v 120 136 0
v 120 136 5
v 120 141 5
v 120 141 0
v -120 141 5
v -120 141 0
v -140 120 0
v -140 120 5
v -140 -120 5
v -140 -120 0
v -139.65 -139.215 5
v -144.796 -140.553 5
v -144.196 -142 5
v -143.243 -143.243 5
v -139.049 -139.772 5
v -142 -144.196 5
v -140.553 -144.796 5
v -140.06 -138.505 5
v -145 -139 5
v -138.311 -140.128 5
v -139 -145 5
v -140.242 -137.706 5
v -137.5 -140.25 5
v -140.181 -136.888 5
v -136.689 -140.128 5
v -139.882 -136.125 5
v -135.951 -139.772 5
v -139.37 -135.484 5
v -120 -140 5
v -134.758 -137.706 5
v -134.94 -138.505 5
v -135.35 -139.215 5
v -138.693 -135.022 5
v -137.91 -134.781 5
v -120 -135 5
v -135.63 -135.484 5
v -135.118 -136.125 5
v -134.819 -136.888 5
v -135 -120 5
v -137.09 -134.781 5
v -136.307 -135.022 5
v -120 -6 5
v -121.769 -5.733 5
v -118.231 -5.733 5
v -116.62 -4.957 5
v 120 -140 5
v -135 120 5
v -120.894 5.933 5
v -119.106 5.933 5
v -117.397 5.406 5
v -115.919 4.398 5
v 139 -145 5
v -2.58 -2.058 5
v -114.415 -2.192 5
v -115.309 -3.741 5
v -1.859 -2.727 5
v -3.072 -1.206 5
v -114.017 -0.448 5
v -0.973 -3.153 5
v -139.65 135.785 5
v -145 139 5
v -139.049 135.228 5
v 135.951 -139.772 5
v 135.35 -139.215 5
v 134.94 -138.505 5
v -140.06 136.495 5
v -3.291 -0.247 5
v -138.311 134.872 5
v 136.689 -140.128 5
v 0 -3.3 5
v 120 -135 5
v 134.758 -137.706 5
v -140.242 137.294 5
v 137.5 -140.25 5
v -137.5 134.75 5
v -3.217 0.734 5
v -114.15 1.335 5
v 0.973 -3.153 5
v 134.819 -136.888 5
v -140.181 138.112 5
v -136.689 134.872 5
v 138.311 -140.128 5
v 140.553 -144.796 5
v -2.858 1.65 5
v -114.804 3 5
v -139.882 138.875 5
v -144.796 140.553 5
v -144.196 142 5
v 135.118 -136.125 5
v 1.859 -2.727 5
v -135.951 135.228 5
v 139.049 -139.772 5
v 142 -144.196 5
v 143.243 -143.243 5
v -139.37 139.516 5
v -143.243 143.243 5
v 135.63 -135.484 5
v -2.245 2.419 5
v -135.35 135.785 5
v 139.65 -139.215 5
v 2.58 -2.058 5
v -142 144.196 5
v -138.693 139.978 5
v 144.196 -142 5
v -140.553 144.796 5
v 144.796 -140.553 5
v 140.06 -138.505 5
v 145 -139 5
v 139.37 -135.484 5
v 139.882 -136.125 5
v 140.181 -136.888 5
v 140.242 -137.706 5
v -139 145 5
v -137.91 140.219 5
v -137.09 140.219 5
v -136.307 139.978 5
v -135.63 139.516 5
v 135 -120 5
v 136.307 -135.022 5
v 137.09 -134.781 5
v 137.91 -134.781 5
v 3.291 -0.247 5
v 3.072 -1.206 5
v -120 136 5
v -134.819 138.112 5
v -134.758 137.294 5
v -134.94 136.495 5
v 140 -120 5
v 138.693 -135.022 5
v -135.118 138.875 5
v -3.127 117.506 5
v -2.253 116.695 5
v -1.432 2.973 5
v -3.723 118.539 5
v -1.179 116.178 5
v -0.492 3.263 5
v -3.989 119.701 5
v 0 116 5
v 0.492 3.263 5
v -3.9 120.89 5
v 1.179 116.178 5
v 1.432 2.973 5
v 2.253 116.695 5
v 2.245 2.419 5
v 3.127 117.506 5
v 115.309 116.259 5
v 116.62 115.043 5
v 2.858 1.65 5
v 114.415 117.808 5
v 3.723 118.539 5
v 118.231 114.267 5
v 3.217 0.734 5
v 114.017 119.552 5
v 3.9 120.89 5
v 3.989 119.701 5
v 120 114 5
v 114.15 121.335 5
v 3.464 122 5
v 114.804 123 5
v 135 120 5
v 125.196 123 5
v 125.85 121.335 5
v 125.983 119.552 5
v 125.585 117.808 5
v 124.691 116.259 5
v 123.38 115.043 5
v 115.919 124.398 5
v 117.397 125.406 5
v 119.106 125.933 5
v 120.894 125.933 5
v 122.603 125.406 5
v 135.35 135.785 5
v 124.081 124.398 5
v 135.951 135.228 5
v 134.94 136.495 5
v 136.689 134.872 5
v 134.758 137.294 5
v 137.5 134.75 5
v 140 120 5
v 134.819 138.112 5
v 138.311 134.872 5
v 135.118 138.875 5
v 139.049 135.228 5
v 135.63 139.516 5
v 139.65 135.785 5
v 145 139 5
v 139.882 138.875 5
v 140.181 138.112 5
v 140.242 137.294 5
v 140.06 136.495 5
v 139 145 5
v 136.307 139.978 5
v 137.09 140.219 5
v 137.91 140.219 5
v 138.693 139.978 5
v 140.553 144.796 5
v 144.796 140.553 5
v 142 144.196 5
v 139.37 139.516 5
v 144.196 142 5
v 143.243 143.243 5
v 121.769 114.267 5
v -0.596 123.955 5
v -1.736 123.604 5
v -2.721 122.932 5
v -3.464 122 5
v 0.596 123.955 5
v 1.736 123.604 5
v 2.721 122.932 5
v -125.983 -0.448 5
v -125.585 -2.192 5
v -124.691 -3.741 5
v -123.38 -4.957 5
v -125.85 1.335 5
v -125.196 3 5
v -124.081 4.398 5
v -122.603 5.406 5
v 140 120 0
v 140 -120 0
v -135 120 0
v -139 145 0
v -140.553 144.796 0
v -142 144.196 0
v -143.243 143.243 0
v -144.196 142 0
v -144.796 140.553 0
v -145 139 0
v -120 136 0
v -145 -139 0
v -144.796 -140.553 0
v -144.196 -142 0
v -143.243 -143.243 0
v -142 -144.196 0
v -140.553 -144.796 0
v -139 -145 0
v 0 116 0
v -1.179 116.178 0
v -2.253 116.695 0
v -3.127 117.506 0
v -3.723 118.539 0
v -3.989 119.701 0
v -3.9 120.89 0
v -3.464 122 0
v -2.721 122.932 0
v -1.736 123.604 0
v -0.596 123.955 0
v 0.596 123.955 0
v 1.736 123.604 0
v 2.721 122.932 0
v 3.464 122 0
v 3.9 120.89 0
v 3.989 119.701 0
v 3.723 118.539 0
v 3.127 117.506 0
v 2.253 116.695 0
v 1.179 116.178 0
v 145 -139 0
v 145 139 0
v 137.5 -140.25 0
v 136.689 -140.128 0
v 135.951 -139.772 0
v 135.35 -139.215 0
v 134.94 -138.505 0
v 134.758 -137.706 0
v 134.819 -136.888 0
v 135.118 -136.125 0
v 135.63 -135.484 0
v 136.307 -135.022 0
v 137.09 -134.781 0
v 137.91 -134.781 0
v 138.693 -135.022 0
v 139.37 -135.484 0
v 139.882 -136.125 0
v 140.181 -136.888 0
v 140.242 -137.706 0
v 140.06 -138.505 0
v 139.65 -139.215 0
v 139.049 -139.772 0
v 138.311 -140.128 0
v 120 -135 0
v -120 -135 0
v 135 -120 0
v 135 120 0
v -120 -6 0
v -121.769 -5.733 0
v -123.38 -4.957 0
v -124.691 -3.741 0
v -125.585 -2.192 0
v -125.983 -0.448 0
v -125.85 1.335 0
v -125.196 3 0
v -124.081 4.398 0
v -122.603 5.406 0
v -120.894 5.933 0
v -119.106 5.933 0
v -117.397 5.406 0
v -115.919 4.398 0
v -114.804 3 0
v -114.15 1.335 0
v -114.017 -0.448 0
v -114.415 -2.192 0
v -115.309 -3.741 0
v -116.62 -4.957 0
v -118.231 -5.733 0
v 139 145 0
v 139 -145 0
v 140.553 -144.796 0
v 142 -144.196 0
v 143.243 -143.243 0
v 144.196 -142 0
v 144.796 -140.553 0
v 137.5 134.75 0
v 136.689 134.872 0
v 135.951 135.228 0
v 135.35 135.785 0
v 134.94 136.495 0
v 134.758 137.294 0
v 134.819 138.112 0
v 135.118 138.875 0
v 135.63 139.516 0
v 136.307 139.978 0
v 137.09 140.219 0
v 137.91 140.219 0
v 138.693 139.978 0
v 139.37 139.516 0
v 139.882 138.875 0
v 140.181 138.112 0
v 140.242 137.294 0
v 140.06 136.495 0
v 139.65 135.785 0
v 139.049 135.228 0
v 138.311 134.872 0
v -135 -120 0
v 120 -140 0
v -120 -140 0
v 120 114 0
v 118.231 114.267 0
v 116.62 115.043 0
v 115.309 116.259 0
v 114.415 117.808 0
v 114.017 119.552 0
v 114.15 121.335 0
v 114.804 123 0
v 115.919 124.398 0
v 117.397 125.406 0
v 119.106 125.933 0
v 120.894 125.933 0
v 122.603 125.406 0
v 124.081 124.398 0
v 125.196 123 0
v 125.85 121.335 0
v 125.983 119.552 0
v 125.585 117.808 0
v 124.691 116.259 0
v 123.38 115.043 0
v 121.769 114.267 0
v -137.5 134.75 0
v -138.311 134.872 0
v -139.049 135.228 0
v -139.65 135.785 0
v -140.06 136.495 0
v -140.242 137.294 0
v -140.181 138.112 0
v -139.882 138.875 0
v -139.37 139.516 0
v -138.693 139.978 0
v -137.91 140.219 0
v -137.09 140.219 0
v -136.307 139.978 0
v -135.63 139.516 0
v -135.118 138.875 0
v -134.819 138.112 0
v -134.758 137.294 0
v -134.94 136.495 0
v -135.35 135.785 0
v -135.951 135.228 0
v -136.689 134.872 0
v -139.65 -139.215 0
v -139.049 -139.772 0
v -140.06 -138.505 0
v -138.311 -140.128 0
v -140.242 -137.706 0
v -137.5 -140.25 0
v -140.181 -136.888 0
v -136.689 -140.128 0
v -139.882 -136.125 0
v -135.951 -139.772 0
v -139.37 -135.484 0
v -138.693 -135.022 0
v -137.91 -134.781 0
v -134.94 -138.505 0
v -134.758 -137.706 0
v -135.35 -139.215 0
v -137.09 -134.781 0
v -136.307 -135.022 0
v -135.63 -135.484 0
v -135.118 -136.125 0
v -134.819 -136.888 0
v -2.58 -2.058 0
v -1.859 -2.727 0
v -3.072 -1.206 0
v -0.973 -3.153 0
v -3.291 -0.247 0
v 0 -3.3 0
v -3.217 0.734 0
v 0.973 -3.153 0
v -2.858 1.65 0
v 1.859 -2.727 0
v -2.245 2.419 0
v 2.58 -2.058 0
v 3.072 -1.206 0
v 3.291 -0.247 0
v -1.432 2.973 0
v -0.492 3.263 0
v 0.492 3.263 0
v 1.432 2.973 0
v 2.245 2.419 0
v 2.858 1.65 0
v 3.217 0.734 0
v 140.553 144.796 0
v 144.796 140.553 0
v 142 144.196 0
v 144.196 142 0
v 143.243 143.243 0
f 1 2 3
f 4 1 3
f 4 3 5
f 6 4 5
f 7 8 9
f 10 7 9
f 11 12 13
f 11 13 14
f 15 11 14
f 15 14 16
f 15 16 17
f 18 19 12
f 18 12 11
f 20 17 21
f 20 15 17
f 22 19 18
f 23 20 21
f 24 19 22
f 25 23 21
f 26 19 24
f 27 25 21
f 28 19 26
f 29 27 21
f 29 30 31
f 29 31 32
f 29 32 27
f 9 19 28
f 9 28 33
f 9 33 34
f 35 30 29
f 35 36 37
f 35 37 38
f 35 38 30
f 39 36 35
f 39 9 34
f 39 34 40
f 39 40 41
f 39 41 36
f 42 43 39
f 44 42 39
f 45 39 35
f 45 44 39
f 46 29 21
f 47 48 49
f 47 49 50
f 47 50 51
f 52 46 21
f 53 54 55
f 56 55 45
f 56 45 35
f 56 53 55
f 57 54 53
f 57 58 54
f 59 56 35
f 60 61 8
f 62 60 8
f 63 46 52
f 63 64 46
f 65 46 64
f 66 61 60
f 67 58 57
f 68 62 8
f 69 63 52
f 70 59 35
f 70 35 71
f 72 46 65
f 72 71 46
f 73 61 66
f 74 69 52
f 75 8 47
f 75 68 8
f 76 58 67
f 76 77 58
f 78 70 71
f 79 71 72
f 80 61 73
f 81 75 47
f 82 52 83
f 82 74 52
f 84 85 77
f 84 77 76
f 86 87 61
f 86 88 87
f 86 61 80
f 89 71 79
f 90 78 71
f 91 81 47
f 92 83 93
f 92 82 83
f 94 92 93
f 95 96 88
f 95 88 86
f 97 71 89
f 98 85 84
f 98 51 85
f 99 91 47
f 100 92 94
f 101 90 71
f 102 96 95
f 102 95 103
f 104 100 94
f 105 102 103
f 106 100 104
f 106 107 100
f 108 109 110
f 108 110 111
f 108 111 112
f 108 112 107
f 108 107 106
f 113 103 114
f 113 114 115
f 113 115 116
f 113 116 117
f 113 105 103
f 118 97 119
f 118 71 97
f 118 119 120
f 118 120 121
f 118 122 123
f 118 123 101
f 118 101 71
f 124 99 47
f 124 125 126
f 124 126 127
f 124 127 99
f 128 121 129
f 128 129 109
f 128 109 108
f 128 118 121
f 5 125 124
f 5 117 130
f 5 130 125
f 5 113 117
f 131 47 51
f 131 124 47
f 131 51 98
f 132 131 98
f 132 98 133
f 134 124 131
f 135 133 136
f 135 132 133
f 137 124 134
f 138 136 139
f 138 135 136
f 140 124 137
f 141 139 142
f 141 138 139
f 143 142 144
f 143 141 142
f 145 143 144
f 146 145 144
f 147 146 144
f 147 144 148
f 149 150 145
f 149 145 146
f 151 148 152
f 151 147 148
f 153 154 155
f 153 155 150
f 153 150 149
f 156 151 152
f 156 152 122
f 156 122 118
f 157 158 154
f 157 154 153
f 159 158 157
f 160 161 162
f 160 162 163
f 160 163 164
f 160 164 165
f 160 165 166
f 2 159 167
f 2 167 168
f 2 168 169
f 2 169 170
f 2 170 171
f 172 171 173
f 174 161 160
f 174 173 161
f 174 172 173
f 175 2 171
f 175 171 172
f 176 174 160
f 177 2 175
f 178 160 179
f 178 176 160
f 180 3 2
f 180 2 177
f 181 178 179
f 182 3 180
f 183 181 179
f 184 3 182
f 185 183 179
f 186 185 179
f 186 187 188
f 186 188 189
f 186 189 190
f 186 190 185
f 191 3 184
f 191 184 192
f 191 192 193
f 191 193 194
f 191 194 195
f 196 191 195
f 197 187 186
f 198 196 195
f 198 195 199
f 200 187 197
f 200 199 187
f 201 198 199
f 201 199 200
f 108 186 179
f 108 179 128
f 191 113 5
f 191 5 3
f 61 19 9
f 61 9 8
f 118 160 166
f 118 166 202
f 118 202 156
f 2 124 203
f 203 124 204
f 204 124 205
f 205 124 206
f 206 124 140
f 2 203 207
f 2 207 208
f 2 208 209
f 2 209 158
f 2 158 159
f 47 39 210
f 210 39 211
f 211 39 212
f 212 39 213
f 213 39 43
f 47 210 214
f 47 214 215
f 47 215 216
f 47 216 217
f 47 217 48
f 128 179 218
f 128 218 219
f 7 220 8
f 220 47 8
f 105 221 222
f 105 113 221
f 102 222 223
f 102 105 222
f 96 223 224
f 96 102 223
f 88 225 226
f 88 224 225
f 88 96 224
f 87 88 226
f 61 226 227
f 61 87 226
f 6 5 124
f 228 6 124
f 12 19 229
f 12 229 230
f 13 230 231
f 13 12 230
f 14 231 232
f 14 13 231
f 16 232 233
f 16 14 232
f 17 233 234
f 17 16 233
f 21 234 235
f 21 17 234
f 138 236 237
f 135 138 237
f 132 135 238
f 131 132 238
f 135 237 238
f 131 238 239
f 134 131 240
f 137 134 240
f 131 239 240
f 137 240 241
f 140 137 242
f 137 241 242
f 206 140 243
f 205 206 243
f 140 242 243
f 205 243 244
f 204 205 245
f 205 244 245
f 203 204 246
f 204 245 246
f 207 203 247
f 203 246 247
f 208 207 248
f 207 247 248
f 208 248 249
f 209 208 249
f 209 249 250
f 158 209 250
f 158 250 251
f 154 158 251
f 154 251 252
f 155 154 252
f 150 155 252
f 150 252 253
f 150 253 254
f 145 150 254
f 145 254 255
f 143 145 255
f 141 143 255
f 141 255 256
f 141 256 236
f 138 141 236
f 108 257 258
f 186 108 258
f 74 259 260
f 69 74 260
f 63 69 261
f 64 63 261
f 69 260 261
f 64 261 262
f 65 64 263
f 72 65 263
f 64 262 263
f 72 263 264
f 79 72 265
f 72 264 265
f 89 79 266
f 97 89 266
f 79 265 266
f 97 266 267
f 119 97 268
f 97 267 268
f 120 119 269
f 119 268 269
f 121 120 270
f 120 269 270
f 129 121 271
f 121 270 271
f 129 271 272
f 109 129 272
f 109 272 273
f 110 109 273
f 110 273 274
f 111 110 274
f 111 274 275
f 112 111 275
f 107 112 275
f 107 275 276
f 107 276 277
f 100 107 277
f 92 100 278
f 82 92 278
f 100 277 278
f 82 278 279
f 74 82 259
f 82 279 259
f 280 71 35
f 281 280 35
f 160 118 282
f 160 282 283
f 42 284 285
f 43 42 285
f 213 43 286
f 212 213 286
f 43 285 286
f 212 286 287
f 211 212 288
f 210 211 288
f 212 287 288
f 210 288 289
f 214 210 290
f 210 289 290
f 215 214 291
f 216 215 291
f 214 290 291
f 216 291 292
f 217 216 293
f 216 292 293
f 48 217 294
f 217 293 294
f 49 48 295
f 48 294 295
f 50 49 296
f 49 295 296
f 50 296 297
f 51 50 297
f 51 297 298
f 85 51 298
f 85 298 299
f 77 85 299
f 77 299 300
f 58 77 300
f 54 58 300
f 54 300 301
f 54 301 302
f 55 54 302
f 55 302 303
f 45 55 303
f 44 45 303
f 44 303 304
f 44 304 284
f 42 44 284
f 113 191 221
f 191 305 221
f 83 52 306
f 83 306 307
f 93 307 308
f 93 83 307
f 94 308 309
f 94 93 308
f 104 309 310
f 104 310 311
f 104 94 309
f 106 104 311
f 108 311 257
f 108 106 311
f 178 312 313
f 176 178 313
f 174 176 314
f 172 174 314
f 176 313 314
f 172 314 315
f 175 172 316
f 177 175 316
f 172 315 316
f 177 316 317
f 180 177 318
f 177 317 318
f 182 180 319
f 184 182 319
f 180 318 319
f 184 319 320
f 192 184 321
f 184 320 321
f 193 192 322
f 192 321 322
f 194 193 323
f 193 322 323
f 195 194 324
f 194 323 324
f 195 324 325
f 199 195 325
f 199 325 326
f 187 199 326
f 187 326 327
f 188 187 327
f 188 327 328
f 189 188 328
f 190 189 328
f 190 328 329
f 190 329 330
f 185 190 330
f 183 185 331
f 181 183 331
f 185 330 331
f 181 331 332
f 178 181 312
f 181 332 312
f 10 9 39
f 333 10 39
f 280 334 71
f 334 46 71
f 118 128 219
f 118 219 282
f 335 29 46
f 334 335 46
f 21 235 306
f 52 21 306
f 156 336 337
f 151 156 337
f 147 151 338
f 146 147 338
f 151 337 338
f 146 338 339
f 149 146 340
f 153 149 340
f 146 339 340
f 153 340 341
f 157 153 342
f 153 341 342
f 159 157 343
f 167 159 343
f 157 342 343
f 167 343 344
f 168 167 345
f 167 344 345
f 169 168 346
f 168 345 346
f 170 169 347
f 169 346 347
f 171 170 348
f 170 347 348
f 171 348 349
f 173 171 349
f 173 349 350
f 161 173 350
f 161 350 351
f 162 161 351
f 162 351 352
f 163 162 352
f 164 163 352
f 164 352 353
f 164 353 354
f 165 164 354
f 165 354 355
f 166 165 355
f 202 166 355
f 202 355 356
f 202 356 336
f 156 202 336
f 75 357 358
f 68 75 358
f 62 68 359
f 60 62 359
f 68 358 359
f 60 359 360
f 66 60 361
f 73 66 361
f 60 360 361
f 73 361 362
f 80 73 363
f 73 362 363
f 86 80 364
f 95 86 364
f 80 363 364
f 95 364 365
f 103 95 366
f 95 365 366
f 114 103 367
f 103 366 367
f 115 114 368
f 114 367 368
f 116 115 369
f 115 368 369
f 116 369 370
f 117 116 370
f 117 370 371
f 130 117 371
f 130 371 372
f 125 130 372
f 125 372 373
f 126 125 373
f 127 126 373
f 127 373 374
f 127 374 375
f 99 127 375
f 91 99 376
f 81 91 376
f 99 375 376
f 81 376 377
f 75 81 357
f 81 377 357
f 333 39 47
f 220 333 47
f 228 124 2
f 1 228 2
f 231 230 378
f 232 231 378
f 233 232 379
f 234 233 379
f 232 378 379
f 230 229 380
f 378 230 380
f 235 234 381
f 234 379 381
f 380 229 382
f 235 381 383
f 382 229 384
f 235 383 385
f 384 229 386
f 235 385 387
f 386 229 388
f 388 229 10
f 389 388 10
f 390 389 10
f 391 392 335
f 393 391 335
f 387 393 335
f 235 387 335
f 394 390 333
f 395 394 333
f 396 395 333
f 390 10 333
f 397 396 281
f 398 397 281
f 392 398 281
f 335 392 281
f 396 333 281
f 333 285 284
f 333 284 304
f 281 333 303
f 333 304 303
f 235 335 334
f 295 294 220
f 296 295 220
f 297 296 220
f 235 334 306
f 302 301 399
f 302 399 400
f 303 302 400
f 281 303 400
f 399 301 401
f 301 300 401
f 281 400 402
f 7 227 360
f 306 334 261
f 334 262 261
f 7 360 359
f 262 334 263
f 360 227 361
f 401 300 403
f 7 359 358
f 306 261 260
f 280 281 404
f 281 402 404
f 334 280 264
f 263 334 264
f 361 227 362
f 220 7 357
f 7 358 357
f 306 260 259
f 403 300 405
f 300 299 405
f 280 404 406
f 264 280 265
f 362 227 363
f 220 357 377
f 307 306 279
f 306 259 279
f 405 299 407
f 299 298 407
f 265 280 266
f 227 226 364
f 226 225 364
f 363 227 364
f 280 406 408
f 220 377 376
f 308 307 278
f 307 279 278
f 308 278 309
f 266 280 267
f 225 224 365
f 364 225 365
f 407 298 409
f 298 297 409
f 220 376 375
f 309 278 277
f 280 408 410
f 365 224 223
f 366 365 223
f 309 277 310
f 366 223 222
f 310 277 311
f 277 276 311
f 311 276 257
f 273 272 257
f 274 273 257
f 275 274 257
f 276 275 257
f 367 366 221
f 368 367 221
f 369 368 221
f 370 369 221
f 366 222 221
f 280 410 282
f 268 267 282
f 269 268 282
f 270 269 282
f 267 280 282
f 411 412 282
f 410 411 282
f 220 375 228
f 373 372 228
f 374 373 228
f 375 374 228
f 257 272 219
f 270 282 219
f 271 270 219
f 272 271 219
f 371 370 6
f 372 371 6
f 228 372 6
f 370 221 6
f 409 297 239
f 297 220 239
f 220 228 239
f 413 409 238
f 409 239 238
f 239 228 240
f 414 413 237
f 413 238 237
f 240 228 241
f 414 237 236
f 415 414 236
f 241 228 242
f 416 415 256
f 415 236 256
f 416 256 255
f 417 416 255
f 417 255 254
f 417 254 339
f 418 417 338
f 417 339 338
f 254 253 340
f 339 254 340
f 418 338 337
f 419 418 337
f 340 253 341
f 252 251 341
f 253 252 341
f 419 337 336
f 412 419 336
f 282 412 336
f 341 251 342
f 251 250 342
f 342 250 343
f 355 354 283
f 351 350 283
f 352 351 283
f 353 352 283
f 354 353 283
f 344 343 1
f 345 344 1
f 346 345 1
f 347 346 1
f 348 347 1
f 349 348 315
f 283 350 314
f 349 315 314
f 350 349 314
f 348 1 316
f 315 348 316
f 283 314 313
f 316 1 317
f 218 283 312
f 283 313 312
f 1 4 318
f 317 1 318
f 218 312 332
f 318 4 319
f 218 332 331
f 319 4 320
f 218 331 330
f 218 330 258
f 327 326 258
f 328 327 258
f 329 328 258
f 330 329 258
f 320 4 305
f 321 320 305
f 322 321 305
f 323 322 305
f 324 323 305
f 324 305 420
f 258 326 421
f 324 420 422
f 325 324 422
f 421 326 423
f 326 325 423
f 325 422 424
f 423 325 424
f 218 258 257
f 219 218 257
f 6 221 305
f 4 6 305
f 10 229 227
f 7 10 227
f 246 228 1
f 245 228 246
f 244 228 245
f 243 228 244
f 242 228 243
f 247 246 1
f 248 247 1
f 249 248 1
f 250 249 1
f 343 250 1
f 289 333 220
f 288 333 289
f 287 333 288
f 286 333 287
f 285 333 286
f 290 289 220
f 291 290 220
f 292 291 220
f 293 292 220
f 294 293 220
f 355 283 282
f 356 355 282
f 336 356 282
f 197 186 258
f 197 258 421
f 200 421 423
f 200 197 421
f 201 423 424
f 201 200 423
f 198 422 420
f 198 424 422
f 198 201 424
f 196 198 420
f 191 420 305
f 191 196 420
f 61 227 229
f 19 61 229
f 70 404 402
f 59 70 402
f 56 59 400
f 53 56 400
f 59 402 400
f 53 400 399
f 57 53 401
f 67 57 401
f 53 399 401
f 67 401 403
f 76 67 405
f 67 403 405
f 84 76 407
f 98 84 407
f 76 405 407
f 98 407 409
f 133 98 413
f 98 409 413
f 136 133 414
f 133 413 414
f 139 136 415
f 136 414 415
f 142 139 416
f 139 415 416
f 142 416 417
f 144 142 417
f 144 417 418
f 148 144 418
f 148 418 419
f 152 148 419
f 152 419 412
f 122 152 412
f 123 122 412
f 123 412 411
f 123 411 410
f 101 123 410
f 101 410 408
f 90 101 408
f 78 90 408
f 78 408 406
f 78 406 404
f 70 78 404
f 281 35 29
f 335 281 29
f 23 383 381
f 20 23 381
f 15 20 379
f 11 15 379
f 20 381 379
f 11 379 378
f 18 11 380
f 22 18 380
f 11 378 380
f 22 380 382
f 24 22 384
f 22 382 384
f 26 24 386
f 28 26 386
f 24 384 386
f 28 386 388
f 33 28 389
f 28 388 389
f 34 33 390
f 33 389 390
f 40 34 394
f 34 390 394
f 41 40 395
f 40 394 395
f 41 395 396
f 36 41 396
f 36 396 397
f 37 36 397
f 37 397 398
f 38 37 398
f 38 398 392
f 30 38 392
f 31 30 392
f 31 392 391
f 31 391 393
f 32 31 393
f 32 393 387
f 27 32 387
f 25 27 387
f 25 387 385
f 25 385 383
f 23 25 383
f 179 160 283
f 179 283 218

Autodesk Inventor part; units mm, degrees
ref_plane "YZ Plane" through (0, 0, 0) normal (1, 0, 0) x (0, 1, 0)
ref_plane "XZ Plane" through (0, 0, 0) normal (0, 1, 0) x (-1, 0, 0)
ref_plane "XY Plane" through (0, 0, 0) normal (0, 0, 1) x (1, 0, 0)
sketch "Sketch1" plane through (0, 0, 0) normal (0, 0, 1) x (1, 0, 0)
  line L0 (-145, -145) -> (145, -145)
  line L1 (145, -145) -> (145, 145)
  line L2 (145, 145) -> (-145, 145)
  line L3 (-145, 145) -> (-145, -145)
  line L4 (-145, -145) -> (145, 145) construction
  line L5 (145, -145) -> (-145, 145) construction
  point P0 (0, 0)
  dimension "d0" = 290
  dimension "d1" = 290
extrude "Extrusion1" add sketch "Sketch1" along normal blind 5
sketch "Sketch2" plane through (0, 0, 5) normal (0, 0, 1) x (1, 0, 0)
  point P0 (0, 0)
  point P1 (0, 0)
hole "Hole1" at (0, 0, 5) direction (0, 0, -1) diameter 6.6 depth 8 tip angle 118 clearance for "Countersunk Flat Head Screw DIN EN ISO 2009" size "M6" standard "DIN"
sketch "Sketch3" plane through (0, 0, 5) normal (0, 0, 1) x (1, 0, 0)
  line L0 (-137.5, -137.5) -> (137.5, -137.5) construction
  line L1 (137.5, -137.5) -> (137.5, 137.5) construction
  line L2 (137.5, 137.5) -> (-137.5, 137.5) construction
  line L3 (-137.5, 137.5) -> (-137.5, -137.5) construction
  line L4 (-137.5, -137.5) -> (137.5, 137.5) construction
  line L5 (137.5, -137.5) -> (-137.5, 137.5) construction
  point P0 (0, 0)
  dimension "d11" = 275
  dimension "d12" = 275
hole "Hole2" at (-137.5, 137.5, 5) at (137.5, 137.5, 5) at (137.5, -137.5, 5) at (-137.5, -137.5, 5) direction (0, 0, -1) diameter 5.5 depth 8 tip angle 118 clearance for "Countersunk Flat Head Screw DIN EN ISO 2009" size "M5" standard "DIN"
fillet "Fillet1" radius 6 4 edges at (-145, -145, 2.5) (145, -145, 2.5) (145, 145, 2.5) (-145, 145, 2.5)
sketch "Sketch4" plane through (0, 0, 5) normal (0, 0, 1) x (1, 0, 0)
  line L0 (-120, -140) -> (120, -140)
  line L1 (120, -140) -> (120, -135)
  line L2 (120, -135) -> (-120, -135)
  line L3 (-120, -135) -> (-120, -140)
  line L4 (140, -120) -> (135, -120)
  line L5 (135, -120) -> (135, 120)
  line L6 (135, 120) -> (140, 120)
  line L7 (140, 120) -> (140, -120)
  line L8 (120, 141) -> (-120, 141)
  line L9 (-120, 141) -> (-120, 136)
  line L10 (-120, 136) -> (120, 136)
  line L11 (120, 136) -> (120, 141)
  line L12 (-135, 120) -> (-140, 120)
  line L13 (-140, 120) -> (-140, -120)
  line L14 (-140, -120) -> (-135, -120)
  line L15 (-135, -120) -> (-135, 120)
  line L16 (-139, -145) -> (139, -145) projected
  line L17 (145, -139) -> (145, 139) projected
  line L18 (139, 145) -> (-139, 145) projected
  line L19 (-145, 139) -> (-145, -139) projected
  point P0 (0, 0)
  point P1 (0, 136)
  point P2 (-135, 0)
  dimension "d21" = 5
  dimension "d22" = 5
  dimension "d23" = 240
  dimension "d24" = 240
  dimension "d25" = 5
  dimension "d26" = 5
  dimension "d27" = 5
  dimension "d28" = 5
  dimension "d29" = 4
  dimension "d30" = 5
extrude "Extrusion2" cut sketch "Sketch4" against normal through all
sketch "Sketch5" plane through (0, 0, 5) normal (0, 0, 1) x (1, 0, 0)
  point P0 (0, 0)
  point P1 (-120, 0)
  point P2 (120, 120)
  dimension "d34" = 120
  dimension "d51" = 120
  dimension "d52" = 120
hole "Hole3" at (-120, 0, 5) at (120, 120, 5) direction (0, 0, -1) diameter 12 depth 8 tip angle 118
sketch "Sketch6" plane through (0, 0, 5) normal (0, 0, 1) x (1, 0, 0)
  point P0 (0, 0)
  point P1 (0, 120)
  dimension "d50" = 120
hole "Hole4" at (0, 120, 5) direction (0, 0, -1) diameter 8 depth 8 tip angle 118
properties part number "Main" material "Polycarbonate, Clear"
